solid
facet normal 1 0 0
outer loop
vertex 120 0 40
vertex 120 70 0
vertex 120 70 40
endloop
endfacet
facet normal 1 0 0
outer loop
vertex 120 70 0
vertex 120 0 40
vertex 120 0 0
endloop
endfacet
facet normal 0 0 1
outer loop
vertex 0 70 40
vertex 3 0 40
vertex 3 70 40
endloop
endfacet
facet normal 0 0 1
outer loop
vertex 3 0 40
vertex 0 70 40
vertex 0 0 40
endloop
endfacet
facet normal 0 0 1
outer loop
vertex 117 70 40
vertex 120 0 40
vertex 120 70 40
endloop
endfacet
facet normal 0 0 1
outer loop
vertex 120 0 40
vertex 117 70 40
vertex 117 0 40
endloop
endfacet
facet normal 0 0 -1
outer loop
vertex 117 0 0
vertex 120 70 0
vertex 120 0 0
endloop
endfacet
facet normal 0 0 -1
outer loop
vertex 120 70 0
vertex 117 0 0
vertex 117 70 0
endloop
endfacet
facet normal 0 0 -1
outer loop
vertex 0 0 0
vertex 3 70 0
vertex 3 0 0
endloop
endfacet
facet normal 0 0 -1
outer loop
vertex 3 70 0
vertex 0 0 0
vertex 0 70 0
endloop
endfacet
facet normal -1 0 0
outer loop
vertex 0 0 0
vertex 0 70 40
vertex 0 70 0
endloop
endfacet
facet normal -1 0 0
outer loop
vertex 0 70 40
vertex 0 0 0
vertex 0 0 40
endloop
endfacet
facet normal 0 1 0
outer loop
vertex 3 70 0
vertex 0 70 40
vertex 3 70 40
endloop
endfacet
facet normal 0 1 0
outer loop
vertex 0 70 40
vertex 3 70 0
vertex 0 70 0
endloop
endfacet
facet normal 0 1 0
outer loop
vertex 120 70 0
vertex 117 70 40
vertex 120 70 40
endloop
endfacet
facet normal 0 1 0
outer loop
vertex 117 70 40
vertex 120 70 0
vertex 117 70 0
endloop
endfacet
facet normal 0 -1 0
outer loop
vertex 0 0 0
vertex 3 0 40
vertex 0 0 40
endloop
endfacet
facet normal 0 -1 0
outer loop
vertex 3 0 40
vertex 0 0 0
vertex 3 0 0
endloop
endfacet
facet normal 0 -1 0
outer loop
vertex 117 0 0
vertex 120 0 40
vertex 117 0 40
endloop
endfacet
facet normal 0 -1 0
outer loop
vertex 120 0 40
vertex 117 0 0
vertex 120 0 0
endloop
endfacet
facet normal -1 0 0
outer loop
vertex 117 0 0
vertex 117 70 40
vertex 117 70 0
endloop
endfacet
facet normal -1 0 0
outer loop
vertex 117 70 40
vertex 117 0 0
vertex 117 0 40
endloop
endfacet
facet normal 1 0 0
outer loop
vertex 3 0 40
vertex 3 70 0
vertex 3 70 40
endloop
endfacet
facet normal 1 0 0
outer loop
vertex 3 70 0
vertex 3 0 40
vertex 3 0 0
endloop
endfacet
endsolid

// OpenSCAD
// Buffer tank for a mini horizontal gel-electrophoresis box. Open-top rectangular tank with a
// solid raised platform for the gel tray that divides the bottom into two buffer chambers. Each
// end wall gets a horizontal 2 mm hole along X at y = 0, z = 30 for the electrode wires.
//

X  = 120;
Y  = 70;
Z  = 40;
w  = 3;
fl = 3;
pL = 60;
pH = 10;

$fn = 64;

inner_X = X - 2 * w;
inner_Z = Z - fl;

difference() {
    cube([X, Y, Z]);
    translate([w, 0, fl]) cube([inner_X, Y, inner_Z]);     // hollow, open top
    translate([w, 0, 0]) cube([inner_X, Y, fl]);           // floor
    translate([w, 0, fl]) cube([pL, Y, pH]);               // raised platform (open top)
    for (x = [-X / 2, X / 2])
        translate([x, -1, 0]) rotate([-90, 0, 0]) cylinder(h = Y, d = 2);  // electrode holes
}
